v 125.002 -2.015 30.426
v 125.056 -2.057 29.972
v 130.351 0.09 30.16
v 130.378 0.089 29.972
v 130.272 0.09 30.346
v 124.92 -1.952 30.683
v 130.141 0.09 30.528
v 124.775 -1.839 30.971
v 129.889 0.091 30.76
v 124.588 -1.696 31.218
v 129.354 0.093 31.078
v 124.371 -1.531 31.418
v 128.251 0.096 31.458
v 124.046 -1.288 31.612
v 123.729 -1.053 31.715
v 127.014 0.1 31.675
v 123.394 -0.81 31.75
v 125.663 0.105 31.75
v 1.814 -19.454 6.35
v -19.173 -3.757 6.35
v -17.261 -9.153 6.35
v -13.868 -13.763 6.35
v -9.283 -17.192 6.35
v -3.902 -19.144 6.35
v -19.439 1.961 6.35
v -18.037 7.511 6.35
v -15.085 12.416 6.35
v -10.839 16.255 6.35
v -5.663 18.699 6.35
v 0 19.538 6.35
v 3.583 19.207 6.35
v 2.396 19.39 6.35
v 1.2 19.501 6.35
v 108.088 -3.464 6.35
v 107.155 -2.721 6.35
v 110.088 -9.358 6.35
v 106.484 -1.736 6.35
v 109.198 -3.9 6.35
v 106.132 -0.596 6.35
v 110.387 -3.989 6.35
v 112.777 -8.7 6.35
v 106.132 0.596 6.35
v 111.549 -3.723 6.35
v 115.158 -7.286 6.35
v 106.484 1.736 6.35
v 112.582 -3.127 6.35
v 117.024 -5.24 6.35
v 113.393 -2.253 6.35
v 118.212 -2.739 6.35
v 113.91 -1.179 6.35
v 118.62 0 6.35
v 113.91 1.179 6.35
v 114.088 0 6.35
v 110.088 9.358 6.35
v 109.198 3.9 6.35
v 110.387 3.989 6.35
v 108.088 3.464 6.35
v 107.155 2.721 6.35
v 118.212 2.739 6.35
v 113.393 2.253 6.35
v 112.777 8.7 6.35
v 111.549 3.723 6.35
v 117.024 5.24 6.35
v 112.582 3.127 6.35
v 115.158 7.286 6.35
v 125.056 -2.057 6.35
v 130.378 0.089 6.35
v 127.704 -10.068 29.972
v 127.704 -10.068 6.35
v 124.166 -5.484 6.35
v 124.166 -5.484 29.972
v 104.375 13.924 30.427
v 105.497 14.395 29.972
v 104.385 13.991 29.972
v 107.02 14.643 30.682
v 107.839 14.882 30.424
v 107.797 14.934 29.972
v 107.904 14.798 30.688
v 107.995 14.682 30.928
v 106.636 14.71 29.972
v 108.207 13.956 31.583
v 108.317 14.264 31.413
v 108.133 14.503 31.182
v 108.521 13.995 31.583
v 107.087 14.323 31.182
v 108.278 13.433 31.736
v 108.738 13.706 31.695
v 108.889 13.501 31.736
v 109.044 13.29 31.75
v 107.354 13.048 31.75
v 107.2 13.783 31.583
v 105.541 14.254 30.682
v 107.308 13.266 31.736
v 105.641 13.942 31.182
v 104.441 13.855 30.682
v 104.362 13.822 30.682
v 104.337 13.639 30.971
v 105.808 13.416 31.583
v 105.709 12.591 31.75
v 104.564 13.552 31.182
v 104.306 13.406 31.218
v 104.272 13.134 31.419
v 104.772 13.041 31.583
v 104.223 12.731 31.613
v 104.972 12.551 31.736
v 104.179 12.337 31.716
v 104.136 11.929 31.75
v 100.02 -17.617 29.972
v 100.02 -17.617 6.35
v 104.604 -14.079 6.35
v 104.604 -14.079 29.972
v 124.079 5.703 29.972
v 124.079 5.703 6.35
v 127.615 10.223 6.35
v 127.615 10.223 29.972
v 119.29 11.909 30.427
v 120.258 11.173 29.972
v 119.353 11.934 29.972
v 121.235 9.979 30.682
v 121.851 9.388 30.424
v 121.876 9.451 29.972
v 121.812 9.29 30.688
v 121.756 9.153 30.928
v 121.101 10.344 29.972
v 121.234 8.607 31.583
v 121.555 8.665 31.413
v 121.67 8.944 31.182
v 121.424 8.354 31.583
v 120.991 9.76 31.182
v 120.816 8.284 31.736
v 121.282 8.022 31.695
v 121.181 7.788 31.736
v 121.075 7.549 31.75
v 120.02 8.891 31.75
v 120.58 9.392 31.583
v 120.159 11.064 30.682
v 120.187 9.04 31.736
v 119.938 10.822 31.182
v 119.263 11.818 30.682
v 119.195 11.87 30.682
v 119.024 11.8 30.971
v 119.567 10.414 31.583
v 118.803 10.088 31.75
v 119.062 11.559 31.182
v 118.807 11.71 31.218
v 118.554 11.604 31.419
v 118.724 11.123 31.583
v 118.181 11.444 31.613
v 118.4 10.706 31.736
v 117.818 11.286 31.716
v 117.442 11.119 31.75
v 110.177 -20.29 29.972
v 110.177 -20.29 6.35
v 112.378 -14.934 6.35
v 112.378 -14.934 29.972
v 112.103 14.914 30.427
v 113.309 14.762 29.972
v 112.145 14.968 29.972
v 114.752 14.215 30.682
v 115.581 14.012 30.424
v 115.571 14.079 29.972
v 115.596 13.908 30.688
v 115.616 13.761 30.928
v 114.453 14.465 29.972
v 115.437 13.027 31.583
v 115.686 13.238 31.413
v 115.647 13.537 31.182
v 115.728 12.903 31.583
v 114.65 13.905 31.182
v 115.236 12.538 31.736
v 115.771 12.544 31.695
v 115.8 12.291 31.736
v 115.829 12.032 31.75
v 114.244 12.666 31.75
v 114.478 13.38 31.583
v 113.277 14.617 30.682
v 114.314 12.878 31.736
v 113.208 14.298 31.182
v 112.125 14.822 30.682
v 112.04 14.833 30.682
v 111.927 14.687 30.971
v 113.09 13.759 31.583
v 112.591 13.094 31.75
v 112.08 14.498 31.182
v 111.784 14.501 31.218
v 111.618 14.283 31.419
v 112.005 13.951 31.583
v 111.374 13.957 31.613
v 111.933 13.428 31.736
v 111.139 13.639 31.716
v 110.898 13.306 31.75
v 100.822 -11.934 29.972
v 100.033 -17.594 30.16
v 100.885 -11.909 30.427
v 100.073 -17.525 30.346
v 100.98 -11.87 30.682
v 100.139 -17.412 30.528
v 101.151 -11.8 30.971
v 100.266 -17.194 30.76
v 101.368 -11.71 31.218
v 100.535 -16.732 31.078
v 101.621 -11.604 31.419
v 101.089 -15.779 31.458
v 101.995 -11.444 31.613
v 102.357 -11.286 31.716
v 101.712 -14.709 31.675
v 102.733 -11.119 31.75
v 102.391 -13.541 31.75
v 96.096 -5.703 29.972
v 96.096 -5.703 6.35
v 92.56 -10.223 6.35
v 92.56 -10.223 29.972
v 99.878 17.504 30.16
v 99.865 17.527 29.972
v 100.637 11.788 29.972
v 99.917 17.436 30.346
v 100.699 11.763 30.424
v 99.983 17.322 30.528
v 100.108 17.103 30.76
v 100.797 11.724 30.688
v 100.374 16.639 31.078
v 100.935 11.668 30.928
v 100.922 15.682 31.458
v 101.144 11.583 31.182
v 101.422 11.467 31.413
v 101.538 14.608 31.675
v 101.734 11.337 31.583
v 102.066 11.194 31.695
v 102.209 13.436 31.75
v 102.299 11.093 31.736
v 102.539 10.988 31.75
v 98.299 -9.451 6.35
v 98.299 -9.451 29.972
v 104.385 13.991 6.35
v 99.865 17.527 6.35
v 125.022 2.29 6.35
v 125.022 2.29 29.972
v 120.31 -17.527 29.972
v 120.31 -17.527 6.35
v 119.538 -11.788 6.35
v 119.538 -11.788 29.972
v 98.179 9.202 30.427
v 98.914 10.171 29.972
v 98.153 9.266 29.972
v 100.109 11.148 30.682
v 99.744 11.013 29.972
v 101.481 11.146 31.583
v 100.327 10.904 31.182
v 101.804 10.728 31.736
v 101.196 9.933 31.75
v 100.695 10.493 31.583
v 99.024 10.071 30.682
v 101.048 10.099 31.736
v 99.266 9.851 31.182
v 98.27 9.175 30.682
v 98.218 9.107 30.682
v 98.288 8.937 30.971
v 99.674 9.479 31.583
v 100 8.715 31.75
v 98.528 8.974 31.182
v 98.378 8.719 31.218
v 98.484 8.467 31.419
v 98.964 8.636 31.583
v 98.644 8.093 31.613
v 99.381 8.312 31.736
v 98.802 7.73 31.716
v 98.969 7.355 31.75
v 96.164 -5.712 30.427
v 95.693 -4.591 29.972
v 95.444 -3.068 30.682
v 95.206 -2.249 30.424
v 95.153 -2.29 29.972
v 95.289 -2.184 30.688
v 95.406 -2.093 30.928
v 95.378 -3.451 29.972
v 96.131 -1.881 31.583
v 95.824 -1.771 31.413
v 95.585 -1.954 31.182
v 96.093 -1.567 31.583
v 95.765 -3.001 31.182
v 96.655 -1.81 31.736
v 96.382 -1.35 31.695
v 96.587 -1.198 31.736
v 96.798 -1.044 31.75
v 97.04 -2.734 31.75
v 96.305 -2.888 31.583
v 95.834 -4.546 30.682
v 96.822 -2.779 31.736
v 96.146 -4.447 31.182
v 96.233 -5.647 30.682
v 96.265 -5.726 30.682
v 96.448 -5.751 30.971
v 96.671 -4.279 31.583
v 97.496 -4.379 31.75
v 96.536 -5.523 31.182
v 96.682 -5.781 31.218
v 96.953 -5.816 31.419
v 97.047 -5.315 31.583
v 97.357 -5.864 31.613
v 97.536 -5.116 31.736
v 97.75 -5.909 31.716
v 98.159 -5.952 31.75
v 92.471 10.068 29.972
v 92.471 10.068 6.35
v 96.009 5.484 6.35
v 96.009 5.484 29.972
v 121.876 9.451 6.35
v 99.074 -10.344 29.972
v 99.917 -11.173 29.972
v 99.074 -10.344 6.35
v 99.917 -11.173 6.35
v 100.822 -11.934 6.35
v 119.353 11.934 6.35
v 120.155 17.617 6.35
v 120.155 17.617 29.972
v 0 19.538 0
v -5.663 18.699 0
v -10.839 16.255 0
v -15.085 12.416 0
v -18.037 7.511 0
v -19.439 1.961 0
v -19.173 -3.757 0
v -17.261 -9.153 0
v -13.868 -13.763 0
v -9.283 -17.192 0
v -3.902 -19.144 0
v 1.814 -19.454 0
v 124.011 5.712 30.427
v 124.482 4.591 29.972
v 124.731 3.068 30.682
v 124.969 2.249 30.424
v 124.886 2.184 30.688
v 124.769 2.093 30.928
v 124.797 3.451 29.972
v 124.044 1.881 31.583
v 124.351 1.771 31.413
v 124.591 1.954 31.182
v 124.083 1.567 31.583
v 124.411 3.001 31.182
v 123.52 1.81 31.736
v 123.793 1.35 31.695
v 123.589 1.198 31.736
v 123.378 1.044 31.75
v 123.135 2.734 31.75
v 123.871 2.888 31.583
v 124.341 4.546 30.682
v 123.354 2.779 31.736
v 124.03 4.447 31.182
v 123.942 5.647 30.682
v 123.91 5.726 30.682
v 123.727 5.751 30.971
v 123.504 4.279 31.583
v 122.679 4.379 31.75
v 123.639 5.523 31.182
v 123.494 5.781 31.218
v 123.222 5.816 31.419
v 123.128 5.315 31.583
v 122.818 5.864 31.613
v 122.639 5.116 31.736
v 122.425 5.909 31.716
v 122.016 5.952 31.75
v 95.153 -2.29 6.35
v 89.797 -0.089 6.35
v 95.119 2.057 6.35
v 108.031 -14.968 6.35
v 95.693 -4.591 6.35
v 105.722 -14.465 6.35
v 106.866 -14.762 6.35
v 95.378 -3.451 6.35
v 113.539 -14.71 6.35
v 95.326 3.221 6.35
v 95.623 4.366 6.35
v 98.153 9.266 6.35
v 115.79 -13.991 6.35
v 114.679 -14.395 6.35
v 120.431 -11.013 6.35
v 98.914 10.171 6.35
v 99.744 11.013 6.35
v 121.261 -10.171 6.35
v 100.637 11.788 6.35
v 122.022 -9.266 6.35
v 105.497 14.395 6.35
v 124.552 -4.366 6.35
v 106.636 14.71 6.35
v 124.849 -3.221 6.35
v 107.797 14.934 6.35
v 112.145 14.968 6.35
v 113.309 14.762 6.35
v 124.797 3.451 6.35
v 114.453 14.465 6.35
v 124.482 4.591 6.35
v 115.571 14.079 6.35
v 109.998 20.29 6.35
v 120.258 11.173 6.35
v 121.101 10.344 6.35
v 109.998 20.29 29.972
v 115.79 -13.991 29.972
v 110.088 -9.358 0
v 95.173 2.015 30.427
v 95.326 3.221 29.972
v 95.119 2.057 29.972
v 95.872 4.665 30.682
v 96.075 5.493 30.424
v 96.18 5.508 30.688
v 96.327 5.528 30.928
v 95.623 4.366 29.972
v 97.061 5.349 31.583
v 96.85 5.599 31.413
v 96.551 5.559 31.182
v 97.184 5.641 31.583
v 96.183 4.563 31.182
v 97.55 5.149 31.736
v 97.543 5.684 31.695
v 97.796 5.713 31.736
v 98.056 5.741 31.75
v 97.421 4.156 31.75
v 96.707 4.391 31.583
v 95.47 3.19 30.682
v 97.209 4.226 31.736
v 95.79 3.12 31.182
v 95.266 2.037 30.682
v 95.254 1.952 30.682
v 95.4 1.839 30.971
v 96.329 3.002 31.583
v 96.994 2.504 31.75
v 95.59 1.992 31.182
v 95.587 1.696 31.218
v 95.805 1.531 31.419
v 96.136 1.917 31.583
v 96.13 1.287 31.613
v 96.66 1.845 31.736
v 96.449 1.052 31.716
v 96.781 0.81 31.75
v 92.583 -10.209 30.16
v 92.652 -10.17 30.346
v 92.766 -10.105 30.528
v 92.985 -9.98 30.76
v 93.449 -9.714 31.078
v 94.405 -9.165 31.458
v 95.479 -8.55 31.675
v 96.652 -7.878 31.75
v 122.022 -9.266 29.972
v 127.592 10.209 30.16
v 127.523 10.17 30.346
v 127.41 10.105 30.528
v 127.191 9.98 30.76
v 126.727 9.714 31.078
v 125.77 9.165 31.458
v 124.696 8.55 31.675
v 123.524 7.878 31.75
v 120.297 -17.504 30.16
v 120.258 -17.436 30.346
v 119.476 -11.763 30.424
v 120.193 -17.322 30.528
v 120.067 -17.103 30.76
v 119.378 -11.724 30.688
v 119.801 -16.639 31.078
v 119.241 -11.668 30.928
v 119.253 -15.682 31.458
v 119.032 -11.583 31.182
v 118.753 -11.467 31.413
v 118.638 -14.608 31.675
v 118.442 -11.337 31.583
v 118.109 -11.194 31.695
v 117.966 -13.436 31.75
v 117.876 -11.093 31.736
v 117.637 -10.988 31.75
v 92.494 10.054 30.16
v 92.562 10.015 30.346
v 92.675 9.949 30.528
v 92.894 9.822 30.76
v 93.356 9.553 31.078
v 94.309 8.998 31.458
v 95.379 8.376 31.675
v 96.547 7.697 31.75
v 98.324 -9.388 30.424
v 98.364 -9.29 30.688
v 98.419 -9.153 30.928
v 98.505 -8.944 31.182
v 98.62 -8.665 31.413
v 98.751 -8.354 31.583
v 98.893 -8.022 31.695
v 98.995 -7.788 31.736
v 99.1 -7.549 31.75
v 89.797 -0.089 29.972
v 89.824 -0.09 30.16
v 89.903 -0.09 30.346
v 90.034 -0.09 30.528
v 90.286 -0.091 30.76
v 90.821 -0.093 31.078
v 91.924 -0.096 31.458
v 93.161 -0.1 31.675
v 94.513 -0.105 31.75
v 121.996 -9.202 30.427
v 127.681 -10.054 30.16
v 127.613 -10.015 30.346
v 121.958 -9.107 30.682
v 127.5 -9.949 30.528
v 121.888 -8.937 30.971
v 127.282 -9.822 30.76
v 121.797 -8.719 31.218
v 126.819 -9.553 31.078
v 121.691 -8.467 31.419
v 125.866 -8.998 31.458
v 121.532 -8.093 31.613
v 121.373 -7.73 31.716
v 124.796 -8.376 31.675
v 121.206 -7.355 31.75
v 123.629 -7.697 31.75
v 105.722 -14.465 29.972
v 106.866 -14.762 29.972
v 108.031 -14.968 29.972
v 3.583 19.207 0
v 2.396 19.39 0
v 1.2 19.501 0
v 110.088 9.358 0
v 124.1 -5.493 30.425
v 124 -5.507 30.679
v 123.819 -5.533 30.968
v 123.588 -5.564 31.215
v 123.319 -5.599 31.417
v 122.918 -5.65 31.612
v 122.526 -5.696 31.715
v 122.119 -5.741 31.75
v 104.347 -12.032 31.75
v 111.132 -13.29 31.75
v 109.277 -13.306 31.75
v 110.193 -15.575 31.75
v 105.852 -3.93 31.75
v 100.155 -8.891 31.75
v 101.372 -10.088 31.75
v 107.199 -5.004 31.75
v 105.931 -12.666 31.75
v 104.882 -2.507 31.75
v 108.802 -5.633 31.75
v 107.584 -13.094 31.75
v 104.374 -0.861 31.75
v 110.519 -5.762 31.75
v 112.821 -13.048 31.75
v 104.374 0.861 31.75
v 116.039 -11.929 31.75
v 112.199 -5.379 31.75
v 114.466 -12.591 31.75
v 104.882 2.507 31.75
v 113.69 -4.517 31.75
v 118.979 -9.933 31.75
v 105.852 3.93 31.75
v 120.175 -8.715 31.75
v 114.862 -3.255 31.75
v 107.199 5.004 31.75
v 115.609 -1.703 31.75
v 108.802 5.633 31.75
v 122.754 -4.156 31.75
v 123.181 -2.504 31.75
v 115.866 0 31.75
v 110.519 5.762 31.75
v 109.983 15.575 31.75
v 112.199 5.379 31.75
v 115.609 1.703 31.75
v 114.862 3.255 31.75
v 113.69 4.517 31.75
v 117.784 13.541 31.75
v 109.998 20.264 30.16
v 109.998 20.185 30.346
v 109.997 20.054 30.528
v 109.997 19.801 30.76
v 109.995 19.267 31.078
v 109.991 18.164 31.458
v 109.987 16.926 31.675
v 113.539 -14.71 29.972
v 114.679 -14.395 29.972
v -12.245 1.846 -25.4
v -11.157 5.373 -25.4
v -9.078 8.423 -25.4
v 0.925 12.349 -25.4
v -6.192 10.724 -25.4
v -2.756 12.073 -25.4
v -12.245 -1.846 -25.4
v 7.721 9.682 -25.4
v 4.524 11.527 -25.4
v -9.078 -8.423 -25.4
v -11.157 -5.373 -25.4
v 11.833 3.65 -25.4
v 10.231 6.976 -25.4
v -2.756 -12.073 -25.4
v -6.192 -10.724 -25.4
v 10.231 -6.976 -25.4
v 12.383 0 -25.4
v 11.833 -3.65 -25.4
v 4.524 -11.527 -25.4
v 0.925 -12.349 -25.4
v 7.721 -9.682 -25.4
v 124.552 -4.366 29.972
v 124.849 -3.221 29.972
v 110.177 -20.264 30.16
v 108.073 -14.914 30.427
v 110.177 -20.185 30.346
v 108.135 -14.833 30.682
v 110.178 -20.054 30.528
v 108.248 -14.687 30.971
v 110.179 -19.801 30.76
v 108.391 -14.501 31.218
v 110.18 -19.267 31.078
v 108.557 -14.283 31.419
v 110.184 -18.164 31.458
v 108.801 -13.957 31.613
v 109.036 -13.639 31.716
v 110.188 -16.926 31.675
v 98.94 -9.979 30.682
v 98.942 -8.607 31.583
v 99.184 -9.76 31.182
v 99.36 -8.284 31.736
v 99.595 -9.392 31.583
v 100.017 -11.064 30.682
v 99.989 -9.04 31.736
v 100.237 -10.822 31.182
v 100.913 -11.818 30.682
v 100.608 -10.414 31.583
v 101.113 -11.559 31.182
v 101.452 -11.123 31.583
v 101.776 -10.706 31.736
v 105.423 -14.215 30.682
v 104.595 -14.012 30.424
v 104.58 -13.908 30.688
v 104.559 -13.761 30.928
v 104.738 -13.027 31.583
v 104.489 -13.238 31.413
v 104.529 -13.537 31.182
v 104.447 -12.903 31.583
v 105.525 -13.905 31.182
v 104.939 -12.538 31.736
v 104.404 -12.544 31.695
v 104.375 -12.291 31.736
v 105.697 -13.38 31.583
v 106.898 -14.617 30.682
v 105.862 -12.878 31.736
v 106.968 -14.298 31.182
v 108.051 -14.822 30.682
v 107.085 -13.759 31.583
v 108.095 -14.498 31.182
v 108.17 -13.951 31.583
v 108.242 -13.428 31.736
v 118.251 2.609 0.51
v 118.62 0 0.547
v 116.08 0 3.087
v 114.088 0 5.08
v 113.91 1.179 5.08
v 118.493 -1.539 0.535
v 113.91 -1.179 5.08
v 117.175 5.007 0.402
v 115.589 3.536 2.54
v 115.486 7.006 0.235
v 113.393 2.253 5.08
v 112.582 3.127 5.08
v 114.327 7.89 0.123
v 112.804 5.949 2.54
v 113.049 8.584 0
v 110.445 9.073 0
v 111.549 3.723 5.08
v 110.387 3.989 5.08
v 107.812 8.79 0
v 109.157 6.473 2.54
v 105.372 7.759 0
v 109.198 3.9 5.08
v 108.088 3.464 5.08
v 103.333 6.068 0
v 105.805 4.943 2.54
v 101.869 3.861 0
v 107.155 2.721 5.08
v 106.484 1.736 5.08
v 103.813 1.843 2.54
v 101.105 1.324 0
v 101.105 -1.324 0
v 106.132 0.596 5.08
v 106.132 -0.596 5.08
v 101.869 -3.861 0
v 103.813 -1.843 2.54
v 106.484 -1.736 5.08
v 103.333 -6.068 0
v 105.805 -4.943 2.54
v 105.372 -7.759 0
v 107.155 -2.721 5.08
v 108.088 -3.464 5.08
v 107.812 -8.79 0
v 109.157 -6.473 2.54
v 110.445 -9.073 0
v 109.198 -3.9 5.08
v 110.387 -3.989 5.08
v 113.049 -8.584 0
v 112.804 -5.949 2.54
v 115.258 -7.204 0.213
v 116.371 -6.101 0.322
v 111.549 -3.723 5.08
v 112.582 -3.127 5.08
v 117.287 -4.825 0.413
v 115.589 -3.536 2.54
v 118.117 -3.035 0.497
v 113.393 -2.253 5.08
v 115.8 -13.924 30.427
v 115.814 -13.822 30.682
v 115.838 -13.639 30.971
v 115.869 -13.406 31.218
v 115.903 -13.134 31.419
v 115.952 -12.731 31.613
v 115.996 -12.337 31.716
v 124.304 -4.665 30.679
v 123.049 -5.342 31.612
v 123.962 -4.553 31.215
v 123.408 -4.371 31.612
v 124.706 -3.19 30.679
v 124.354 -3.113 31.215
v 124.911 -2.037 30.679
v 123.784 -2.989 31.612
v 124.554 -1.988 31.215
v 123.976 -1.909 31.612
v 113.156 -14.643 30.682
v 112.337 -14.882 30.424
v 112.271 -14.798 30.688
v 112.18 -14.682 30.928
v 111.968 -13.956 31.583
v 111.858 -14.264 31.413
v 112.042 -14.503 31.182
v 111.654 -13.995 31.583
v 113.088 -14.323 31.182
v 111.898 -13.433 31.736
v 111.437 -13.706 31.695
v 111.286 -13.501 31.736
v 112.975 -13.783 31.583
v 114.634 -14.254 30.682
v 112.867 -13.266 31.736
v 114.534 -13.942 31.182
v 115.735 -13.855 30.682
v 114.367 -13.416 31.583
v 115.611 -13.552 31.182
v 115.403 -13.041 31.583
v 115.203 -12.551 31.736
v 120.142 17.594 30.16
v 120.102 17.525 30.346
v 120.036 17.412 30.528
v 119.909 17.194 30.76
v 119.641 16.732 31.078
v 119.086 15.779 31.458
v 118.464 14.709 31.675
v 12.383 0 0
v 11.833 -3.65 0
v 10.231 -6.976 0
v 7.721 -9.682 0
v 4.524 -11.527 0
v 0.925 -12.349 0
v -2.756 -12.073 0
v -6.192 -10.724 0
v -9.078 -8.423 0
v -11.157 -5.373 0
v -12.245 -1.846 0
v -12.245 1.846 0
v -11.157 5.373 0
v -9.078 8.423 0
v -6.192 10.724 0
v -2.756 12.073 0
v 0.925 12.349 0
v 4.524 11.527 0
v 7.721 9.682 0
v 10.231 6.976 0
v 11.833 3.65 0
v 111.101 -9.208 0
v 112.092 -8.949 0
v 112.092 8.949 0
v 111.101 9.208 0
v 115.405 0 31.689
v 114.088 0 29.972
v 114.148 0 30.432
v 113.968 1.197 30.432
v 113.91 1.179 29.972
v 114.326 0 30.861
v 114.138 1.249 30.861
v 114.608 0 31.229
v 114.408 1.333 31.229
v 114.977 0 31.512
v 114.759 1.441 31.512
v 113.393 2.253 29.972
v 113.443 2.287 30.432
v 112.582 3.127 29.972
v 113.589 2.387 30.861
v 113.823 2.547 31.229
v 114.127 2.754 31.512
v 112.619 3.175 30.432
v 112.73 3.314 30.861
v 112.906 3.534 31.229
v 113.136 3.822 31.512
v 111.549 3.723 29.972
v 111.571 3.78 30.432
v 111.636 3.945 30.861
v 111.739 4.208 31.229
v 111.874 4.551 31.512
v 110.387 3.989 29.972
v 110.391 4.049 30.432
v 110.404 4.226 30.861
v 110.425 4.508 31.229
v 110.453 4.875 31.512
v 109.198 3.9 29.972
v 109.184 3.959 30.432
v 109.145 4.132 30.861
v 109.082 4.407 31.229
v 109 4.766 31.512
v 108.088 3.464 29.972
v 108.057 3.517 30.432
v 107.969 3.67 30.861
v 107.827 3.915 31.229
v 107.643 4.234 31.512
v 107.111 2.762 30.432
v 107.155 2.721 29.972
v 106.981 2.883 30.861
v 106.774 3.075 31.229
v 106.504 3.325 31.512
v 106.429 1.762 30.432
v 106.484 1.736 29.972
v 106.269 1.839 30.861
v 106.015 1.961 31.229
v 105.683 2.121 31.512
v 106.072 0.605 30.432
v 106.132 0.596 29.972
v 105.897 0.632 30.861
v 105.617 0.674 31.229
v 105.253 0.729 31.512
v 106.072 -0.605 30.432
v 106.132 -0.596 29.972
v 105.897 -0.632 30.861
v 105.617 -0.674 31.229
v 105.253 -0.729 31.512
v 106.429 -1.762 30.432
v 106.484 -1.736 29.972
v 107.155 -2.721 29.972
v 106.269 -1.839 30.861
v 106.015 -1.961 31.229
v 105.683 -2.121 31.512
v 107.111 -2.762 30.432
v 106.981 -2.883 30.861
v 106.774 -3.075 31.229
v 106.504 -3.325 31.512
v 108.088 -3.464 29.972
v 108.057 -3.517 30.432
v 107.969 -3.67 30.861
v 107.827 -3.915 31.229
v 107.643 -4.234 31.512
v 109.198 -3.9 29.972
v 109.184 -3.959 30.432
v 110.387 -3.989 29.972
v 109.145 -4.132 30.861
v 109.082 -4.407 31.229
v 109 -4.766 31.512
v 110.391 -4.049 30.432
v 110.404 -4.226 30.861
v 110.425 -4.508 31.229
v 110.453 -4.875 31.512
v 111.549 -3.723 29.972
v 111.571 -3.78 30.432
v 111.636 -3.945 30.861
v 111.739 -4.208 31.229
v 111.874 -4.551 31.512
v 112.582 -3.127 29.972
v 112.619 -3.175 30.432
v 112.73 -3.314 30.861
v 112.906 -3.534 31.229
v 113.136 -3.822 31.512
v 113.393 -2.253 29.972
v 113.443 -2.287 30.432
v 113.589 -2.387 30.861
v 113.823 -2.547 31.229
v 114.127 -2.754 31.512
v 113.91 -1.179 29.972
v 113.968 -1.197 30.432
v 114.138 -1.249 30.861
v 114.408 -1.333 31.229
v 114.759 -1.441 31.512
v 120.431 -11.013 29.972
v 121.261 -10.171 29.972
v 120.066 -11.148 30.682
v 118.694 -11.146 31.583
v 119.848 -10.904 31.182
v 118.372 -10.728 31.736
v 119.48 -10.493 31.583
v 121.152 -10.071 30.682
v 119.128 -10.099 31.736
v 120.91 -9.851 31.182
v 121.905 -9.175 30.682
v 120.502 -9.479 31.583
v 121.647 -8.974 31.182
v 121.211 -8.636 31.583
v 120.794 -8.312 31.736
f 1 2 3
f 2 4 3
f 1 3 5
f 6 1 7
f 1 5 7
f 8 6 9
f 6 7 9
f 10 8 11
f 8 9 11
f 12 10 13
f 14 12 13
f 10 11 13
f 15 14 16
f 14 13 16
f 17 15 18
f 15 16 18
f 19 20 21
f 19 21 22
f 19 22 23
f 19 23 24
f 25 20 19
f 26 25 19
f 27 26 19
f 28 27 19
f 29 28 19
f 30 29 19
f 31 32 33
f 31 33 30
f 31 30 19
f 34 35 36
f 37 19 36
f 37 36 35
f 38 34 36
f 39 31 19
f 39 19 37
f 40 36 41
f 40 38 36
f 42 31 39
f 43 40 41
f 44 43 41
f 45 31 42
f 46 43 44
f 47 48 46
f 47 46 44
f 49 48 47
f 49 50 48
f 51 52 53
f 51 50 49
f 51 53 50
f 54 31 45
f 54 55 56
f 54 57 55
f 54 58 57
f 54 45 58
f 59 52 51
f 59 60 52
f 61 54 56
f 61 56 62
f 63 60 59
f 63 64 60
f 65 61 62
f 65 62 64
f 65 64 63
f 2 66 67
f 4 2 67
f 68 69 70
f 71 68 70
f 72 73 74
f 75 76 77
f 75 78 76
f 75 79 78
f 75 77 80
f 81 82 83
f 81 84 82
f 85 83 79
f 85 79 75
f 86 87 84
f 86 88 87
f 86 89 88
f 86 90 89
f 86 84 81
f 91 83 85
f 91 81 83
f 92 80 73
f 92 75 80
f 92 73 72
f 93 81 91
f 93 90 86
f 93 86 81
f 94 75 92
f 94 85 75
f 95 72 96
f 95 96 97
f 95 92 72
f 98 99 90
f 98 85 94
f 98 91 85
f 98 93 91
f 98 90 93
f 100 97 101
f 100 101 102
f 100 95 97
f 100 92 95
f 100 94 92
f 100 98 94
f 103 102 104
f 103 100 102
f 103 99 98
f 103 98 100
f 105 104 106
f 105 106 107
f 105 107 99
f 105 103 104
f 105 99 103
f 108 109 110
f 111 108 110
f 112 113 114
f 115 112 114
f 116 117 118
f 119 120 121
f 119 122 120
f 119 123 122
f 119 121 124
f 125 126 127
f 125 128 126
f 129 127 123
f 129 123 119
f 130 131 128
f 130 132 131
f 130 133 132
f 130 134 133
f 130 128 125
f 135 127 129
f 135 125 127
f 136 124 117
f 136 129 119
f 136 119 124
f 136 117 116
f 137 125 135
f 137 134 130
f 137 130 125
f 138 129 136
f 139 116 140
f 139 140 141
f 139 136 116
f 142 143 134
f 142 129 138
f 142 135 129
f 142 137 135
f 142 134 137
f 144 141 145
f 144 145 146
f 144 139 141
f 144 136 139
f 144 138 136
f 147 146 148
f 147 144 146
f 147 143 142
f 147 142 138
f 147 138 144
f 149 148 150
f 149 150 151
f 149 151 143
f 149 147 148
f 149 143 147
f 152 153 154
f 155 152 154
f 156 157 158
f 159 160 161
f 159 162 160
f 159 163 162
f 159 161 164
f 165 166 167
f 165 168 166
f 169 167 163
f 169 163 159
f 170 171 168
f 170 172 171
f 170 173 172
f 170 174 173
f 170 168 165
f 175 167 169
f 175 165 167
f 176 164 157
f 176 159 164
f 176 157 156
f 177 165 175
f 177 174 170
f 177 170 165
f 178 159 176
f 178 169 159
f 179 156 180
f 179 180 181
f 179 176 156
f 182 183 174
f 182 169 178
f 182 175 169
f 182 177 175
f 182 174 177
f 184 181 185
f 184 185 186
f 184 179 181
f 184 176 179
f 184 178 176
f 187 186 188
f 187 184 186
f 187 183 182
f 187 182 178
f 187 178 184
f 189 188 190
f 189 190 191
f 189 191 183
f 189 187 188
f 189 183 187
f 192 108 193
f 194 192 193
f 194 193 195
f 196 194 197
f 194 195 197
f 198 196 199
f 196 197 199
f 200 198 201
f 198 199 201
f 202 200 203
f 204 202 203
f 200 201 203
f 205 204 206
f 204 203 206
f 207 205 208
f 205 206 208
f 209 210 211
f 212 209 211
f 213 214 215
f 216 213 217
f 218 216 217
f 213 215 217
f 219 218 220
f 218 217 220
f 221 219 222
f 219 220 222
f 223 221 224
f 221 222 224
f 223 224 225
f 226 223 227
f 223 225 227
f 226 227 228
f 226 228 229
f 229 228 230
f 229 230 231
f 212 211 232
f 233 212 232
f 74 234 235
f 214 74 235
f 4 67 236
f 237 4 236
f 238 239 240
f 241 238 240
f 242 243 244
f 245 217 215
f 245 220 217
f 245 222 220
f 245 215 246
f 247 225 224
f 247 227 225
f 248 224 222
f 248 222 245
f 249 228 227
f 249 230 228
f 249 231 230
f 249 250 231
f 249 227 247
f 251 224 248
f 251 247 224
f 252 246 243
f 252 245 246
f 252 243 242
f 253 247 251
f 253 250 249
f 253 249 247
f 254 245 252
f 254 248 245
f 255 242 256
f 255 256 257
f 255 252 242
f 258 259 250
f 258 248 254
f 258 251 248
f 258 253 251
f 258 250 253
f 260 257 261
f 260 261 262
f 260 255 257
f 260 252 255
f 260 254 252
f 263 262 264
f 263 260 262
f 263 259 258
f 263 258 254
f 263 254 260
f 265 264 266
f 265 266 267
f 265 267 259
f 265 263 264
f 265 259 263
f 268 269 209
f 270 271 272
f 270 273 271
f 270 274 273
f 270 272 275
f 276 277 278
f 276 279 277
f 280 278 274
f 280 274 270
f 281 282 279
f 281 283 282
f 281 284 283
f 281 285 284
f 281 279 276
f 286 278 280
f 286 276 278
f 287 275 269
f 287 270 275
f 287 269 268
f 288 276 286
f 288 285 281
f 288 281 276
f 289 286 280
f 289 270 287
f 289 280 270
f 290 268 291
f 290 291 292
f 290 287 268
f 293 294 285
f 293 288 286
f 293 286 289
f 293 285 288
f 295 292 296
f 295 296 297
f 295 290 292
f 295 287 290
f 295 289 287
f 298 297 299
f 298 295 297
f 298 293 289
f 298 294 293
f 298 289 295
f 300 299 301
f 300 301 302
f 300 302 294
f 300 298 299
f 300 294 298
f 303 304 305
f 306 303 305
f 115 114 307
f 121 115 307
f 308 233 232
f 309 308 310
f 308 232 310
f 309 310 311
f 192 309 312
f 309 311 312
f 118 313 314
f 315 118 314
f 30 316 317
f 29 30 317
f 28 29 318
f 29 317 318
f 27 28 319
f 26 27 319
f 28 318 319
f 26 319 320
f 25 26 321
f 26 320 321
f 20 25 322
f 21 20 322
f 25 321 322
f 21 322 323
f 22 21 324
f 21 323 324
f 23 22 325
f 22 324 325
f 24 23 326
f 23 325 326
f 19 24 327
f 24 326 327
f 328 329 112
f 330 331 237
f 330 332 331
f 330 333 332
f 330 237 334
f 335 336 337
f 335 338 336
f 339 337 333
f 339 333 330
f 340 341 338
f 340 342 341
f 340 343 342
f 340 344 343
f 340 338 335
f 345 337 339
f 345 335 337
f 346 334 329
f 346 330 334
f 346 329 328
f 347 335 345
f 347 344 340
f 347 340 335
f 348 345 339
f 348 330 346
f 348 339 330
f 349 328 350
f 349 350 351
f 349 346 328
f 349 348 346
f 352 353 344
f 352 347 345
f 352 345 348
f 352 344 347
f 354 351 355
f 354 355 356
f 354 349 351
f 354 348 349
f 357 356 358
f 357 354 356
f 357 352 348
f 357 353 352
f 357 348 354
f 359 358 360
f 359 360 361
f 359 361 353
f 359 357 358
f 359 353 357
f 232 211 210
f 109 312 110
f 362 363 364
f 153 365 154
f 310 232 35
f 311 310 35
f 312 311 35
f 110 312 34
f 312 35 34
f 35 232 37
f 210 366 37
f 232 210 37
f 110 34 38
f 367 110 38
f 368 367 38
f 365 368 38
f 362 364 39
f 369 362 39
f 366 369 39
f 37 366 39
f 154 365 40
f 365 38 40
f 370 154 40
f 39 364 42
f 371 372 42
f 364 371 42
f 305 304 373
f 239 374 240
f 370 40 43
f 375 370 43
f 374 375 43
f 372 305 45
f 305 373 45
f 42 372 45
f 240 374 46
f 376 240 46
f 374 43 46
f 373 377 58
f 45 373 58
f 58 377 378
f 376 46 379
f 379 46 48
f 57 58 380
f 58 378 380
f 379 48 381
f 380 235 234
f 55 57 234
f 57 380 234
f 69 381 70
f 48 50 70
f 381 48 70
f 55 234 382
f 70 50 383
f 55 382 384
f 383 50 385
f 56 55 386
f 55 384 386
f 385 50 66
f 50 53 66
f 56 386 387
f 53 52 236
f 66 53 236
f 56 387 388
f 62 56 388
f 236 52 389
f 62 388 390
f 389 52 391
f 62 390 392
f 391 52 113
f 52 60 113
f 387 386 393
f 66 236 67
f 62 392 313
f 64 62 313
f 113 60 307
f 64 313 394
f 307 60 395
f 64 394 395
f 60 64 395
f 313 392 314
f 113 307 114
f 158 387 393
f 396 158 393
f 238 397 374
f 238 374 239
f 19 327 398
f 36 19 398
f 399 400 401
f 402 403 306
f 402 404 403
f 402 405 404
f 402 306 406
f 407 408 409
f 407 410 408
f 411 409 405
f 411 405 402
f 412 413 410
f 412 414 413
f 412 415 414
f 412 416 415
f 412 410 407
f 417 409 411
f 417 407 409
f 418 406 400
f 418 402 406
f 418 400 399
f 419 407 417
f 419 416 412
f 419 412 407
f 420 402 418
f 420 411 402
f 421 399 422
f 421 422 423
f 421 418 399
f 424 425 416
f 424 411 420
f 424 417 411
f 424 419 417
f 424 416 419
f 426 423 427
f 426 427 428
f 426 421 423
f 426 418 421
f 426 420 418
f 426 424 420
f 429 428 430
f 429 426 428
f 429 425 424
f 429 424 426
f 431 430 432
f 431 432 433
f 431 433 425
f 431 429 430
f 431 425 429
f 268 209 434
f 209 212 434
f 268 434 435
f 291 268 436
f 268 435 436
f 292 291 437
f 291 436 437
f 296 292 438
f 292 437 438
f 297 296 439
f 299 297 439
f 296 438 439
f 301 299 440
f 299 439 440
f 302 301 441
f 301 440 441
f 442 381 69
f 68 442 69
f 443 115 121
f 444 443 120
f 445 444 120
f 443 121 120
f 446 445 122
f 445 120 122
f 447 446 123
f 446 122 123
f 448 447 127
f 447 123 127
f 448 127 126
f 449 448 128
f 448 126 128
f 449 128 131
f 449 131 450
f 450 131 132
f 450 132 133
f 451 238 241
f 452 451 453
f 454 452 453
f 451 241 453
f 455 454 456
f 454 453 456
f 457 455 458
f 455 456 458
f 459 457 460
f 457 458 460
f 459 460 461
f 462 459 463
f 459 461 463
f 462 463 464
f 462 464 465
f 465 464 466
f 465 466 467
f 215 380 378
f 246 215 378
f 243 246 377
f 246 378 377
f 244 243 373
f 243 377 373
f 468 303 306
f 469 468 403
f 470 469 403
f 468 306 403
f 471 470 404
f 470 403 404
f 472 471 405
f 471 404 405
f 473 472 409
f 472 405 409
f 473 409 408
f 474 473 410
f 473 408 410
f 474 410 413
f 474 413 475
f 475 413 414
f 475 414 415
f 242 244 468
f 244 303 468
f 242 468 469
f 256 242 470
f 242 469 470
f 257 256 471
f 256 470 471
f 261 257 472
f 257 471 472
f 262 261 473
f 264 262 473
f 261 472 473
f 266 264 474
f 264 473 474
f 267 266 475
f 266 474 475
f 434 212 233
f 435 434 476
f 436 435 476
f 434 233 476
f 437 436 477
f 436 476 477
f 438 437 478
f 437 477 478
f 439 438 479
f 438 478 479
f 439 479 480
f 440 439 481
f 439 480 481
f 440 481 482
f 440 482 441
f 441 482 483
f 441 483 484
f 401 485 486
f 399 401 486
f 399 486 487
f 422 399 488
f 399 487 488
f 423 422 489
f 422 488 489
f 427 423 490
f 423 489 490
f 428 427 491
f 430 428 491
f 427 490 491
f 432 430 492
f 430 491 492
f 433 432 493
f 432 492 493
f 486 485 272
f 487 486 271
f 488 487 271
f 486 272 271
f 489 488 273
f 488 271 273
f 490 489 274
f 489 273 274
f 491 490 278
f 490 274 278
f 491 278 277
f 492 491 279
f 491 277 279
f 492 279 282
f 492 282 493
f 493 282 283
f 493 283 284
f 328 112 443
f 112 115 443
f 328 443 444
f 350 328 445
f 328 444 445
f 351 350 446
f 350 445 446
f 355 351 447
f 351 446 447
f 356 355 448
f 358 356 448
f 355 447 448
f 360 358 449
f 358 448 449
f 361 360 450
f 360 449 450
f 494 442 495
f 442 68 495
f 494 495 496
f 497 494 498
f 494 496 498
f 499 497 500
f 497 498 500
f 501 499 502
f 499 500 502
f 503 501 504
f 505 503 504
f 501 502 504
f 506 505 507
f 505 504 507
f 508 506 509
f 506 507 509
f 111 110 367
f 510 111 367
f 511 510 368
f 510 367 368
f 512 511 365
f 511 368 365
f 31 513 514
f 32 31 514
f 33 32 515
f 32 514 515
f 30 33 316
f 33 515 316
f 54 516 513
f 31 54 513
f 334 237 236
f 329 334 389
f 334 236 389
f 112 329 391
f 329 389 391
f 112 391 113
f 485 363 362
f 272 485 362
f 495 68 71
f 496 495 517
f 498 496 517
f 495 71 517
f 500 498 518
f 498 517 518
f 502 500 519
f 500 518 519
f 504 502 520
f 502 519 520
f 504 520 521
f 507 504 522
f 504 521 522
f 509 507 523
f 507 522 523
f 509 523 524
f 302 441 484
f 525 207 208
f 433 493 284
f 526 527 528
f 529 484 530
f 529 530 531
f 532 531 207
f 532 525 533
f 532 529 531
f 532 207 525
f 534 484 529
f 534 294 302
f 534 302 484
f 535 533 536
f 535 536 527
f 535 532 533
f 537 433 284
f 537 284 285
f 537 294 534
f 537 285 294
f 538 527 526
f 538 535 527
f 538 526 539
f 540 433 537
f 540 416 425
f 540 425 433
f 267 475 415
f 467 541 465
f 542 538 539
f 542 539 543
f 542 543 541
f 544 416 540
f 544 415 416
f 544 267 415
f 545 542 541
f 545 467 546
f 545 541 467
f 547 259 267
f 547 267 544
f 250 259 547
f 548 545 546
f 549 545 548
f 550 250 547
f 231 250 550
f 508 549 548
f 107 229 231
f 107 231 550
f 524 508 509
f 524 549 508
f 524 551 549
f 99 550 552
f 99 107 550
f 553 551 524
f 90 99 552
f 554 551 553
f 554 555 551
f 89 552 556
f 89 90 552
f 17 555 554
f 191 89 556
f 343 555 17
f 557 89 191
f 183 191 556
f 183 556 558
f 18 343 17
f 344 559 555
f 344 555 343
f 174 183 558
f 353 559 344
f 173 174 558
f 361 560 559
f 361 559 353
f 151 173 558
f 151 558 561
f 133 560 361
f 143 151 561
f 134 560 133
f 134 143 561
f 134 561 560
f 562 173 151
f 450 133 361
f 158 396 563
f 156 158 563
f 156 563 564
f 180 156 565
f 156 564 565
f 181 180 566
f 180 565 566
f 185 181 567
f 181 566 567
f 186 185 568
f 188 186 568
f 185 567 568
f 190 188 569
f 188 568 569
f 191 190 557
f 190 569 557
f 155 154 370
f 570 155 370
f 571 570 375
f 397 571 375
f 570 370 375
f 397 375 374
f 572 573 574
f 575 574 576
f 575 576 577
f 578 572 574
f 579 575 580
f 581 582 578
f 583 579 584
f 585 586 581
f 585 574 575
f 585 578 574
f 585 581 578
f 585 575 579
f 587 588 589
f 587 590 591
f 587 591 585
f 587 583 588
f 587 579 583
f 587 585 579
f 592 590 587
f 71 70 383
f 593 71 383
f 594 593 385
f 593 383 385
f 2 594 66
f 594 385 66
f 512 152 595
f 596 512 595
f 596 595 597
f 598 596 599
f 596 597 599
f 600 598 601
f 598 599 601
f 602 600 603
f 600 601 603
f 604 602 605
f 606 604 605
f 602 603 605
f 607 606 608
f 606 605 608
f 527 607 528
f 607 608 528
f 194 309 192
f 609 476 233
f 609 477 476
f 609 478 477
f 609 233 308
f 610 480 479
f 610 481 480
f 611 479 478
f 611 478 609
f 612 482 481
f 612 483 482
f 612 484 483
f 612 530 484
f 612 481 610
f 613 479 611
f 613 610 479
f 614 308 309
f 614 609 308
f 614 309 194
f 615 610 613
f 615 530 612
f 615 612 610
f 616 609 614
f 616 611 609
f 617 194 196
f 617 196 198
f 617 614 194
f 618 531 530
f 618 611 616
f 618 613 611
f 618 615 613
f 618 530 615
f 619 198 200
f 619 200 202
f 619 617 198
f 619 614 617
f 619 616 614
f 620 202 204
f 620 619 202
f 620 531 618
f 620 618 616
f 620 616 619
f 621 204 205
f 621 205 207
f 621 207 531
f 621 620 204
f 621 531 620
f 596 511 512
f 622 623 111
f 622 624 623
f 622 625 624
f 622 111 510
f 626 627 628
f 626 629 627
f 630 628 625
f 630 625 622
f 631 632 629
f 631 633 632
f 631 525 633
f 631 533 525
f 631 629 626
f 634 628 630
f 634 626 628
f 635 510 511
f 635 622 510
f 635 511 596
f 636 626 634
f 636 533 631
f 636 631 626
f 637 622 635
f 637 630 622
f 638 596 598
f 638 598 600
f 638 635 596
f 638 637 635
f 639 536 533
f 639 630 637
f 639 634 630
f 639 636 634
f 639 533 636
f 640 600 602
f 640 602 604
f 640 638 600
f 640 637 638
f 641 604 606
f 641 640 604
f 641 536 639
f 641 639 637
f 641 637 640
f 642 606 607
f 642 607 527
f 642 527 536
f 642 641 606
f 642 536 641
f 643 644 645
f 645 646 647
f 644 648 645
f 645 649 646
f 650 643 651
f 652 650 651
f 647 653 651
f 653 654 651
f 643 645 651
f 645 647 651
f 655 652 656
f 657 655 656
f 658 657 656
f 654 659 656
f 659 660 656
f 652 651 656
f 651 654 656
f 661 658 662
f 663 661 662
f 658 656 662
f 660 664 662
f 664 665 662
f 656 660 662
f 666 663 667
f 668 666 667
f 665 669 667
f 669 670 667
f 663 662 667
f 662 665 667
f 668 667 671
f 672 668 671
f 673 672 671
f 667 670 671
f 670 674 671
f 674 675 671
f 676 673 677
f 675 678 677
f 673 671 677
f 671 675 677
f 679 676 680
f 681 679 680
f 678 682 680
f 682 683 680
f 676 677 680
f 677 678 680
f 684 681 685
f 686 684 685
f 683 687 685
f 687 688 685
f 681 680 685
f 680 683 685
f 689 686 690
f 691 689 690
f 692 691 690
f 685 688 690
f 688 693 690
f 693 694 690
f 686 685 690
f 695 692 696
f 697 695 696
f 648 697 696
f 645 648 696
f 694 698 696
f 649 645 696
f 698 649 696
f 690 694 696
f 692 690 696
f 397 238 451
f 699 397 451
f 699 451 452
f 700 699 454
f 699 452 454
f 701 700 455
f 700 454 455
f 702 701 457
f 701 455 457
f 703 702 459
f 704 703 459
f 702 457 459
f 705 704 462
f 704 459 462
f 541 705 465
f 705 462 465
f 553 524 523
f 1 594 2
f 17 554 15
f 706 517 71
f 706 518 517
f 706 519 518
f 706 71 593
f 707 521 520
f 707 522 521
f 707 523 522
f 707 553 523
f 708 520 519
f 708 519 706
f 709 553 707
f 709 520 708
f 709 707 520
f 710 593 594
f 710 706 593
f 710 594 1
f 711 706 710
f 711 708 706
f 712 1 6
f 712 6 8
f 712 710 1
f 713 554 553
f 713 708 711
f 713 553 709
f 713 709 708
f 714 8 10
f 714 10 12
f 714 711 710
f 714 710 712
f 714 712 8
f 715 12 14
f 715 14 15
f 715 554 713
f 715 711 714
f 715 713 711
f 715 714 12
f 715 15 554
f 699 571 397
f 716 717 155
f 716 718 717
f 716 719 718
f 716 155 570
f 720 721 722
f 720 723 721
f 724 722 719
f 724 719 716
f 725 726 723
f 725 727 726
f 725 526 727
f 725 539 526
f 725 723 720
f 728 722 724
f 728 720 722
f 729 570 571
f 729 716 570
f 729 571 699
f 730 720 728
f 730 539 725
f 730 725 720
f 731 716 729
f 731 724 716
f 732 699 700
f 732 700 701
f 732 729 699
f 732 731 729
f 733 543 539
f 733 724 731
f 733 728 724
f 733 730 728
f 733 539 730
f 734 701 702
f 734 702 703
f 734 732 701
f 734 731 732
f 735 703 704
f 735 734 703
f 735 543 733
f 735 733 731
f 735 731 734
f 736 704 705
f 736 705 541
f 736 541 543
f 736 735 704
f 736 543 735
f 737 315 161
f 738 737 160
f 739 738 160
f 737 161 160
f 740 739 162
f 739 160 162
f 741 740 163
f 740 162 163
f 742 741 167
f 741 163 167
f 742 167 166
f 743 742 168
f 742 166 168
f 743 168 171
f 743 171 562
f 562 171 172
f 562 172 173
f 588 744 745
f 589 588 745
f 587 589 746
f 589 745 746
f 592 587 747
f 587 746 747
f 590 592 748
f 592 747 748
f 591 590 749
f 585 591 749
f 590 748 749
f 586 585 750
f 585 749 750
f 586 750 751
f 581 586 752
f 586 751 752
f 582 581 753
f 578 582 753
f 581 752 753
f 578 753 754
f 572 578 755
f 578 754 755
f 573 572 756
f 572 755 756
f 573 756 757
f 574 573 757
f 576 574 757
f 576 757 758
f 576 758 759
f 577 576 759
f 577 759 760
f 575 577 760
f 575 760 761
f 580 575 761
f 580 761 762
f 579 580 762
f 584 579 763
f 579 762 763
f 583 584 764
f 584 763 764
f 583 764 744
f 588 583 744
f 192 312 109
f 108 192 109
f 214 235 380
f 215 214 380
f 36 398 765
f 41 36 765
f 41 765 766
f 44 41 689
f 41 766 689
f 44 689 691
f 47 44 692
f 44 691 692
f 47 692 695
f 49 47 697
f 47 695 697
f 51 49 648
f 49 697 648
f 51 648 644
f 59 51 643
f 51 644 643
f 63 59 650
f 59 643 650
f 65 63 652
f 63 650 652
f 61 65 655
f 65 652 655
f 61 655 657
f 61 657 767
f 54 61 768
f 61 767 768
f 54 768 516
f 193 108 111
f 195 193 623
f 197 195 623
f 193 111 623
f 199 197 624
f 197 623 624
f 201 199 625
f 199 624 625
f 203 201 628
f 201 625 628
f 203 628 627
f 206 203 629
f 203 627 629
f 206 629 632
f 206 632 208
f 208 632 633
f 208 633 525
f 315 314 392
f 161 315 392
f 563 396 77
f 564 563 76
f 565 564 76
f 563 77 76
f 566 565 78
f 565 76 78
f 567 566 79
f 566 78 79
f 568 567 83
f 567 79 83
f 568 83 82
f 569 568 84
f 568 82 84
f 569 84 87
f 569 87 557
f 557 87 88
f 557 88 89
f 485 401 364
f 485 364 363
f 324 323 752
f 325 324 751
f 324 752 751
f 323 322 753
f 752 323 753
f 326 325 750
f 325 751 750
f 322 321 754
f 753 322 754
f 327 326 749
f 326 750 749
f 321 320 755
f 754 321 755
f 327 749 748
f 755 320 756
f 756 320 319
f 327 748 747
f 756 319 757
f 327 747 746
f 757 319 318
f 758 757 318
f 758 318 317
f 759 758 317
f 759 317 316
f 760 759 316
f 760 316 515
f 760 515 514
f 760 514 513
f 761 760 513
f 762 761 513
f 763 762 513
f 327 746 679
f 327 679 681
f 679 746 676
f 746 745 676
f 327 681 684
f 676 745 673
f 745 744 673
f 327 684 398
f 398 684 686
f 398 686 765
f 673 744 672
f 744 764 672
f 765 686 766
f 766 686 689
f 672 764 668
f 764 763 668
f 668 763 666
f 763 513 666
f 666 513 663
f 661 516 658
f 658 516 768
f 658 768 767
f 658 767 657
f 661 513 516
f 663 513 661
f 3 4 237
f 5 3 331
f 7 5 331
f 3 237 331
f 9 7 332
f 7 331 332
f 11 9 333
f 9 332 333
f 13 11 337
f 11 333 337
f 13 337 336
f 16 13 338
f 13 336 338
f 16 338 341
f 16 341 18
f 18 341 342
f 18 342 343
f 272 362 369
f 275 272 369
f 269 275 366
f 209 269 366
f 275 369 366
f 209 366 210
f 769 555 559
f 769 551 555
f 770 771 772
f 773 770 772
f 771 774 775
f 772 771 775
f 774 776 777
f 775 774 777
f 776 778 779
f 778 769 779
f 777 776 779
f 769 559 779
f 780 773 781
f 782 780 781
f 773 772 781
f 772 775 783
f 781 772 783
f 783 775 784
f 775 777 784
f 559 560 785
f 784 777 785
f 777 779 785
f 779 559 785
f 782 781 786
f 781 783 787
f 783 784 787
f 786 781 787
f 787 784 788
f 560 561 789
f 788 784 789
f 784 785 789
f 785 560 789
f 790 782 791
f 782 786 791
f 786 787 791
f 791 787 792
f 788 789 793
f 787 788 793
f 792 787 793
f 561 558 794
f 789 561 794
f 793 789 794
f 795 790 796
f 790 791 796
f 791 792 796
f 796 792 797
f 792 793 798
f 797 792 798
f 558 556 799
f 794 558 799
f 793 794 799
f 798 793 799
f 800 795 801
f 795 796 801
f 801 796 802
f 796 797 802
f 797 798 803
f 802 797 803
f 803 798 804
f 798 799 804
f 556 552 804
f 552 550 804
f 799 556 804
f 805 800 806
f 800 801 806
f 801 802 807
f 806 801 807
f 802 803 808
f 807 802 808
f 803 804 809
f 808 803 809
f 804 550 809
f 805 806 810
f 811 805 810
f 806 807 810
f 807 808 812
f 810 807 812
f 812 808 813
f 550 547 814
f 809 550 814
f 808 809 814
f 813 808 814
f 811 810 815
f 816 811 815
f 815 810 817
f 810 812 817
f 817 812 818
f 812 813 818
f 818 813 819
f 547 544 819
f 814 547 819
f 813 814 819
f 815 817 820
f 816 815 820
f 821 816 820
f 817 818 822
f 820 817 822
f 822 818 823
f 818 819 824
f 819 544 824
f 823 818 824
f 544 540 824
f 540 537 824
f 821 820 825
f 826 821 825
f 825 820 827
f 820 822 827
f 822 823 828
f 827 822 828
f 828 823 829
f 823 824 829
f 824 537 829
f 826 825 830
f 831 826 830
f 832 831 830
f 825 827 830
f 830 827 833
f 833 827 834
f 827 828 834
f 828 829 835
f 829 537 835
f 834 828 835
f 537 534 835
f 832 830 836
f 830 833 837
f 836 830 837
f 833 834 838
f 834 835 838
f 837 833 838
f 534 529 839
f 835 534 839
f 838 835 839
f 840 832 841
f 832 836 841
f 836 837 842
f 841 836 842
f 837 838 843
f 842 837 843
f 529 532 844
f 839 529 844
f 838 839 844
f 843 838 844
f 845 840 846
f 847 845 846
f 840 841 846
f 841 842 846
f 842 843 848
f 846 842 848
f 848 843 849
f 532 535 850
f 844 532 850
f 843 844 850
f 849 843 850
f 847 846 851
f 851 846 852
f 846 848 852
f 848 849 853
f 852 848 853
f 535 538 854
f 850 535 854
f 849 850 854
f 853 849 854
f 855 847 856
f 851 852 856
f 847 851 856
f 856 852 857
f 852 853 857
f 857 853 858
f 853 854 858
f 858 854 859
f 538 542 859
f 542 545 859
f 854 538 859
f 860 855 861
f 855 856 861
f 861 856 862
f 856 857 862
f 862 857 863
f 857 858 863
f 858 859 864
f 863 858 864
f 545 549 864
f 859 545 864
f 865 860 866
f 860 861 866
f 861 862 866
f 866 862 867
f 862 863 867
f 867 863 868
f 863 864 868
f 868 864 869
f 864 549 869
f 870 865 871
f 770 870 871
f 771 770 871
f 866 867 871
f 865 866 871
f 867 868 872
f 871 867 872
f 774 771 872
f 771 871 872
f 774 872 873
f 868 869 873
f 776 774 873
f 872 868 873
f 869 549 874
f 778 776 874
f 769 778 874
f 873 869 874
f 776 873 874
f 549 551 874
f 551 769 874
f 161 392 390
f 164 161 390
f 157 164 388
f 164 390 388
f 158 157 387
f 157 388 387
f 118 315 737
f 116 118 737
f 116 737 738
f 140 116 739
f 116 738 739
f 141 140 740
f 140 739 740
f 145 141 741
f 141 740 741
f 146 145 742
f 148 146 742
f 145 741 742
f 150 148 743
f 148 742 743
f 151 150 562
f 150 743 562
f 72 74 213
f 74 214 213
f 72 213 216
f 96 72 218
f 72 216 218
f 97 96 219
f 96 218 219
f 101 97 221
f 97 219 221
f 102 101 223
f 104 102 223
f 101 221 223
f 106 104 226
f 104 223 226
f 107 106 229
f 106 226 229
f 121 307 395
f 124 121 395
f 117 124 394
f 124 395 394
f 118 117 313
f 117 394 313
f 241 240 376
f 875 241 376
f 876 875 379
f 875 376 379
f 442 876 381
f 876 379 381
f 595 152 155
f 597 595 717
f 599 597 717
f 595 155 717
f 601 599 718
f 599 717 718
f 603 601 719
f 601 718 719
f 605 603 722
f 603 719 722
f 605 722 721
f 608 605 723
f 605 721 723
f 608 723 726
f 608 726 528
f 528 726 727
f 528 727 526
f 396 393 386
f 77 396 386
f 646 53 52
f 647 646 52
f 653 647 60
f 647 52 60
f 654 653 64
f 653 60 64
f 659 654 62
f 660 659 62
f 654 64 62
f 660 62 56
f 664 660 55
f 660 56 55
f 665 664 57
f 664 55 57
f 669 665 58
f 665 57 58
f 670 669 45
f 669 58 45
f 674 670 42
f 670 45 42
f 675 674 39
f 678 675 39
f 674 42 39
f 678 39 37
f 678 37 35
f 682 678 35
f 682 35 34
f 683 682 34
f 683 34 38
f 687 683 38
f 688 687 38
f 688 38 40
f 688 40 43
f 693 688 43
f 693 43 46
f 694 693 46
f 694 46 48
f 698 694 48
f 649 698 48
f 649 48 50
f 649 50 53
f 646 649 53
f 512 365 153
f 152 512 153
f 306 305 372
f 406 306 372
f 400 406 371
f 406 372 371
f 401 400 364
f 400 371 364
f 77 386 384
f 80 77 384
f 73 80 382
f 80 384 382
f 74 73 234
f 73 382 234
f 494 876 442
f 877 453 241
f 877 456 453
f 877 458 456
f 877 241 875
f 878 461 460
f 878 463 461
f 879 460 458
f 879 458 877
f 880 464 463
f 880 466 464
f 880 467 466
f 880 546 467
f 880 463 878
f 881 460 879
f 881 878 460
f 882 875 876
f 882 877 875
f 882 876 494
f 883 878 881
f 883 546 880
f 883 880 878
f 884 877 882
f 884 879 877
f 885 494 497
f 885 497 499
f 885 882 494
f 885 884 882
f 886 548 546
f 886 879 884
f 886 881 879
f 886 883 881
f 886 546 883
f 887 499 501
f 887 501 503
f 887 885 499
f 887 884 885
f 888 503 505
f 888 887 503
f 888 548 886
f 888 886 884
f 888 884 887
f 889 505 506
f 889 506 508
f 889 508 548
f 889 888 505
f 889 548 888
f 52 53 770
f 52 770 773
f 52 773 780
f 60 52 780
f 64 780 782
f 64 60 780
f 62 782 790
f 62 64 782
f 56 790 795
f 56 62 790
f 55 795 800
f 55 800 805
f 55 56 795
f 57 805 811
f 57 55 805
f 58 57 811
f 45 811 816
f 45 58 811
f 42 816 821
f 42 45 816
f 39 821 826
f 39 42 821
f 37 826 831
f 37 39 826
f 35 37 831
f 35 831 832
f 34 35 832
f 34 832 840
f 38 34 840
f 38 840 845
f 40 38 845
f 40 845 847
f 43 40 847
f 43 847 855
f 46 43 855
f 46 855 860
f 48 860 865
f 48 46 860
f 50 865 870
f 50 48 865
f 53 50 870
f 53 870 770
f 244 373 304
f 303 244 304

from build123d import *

# Parameters (mm, degrees)
F1_DEPTH = 6.35
F2_R     = 4
F3_DEPTH = 25.4
F5_R     = 12.3831854663
F6_DEPTH = 25.4
F7_R     = 4
F8_DEPTH = 25.4
F9_R     = 1.778


# Not quite as in the source:
# - a fillet or chamfer that OpenCascade refuses, or shapes differently, is made with other operations: its cross-section is extruded or revolved along the edge and cut away or added


with BuildPart() as f1:
    # F0 (on Top) → F1 (new body)
    with BuildSketch(Plane.XY):
        with BuildLine():
            Line((0, 19.5379621843), (3.5827930435, 19.2066540637))
            ThreePointArc((3.5827930435, 19.2066540637), (1.7990394008, 19.4549588422), (0, 19.5379621843))
        make_face()
        with BuildLine():
            Line((110.0876327298, 9.3579360824), (3.5827930435, 19.2066540637))
            Line((3.5827930435, 19.2066540637), (0, 19.5379621843))
            ThreePointArc((0, 19.5379621843), (-19.5168552551, -0.9079247047), (1.813887741, -19.453580071))
            Line((1.8138877409, -19.453580071), (110.0876327298, -9.3579360824))
            ThreePointArc((110.0876327298, -9.3579360824), (118.6201465698, 0), (110.0876327298, 9.3579360824))
        make_face()
    extrude(amount=F1_DEPTH)

    # F2 (on face) → F3 (cut)
    with BuildSketch(Plane.XY.offset(6.35)):
        with Locations((110.0876327298, 0)):
            Circle(F2_R)
    extrude(amount=-F3_DEPTH, mode=Mode.SUBTRACT)

    # F4: chamfer of 5.08 on 1 edges, made by hand

    # F4_s1 → F4_t2 (revolve, cut)
    with BuildSketch(Plane.XZ):
        Polygon((119.1676327298, 0), (114.0876327298, 5.08), (114.0876327298, 0), align=None)
    revolve(axis=Axis((110.0876327298, 0, 0), (0, 0, 1)), mode=Mode.SUBTRACT)

    # F5 (on face) → F6 (join)
    with BuildSketch(Plane(origin=(0, 0, 0), x_dir=(1, 0, 0), z_dir=(0, 0, -1))):
        Circle(F5_R)
    extrude(amount=F6_DEPTH)


with BuildPart() as f8:
    # F7 (on face) → F8 (new body)
    with BuildSketch(Plane.XY.offset(6.35)):
        with BuildLine():
            ThreePointArc((125.0559656513, -2.0569956955), (125.1614333891, -1.0309002972), (125.1966440058, 0))
            ThreePointArc((125.1966440058, 0), (125.1529244508, 1.1485674127), (125.0220188001, 2.2904878178))
            ThreePointArc((125.0220188001, 2.2904878178), (124.6508382593, 4.0243342858), (124.0790871399, 5.7027559329))
            ThreePointArc((124.0790871399, 5.7027559329), (123.1130347073, 7.656443369), (121.8759465477, 9.4508136724))
            ThreePointArc((121.8759465477, 9.4508136724), (120.687571536, 10.7667784895), (119.3532097183, 11.9344587145))
            ThreePointArc((119.3532097183, 11.9344587145), (117.5397400523, 13.143375449), (115.5712051277, 14.0788016356))
            ThreePointArc((115.5712051277, 14.0788016356), (113.8840597698, 14.624273092), (112.1446284253, 14.9683329214))
            ThreePointArc((112.1446284253, 14.9683329214), (109.9696592584, 15.1085506915), (107.797144912, 14.9343860702))
            ThreePointArc((107.797144912, 14.9343860702), (106.0632984441, 14.5632055295), (104.3848767969, 13.99145441))
            ThreePointArc((104.3848767969, 13.99145441), (102.4311893608, 13.0254019775), (100.6368190574, 11.7883138179))
            ThreePointArc((100.6368190574, 11.7883138179), (99.3208542403, 10.5999388062), (98.1531740153, 9.2655769885))
            ThreePointArc((98.1531740153, 9.2655769885), (96.9442572809, 7.4521073225), (96.0088310942, 5.4835723979))
            ThreePointArc((96.0088310942, 5.4835723979), (95.4633596378, 3.79642704), (95.1192998084, 2.0569956955))
            ThreePointArc((95.1192998084, 2.0569956955), (94.9790820383, -0.1179734715), (95.1532466596, -2.2904878178))
            ThreePointArc((95.1532466596, -2.2904878178), (95.5244272003, -4.0243342858), (96.0961783198, -5.7027559329))
            ThreePointArc((96.0961783198, -5.7027559329), (97.0622307523, -7.656443369), (98.299318912, -9.4508136724))
            ThreePointArc((98.299318912, -9.4508136724), (99.4876939236, -10.7667784895), (100.8220557413, -11.9344587145))
            ThreePointArc((100.8220557413, -11.9344587145), (102.6355254073, -13.143375449), (104.604060332, -14.0788016356))
            ThreePointArc((104.604060332, -14.0788016356), (106.2912056898, -14.624273092), (108.0306370343, -14.9683329214))
            ThreePointArc((108.0306370343, -14.9683329214), (110.2056062013, -15.1085506915), (112.3781205476, -14.9343860702))
            ThreePointArc((112.3781205476, -14.9343860702), (114.1119670156, -14.5632055295), (115.7903886627, -13.99145441))
            ThreePointArc((115.7903886627, -13.99145441), (117.7440760988, -13.0254019775), (119.5384464022, -11.7883138179))
            ThreePointArc((119.5384464022, -11.7883138179), (120.8544112194, -10.5999388062), (122.0220914443, -9.2655769885))
            ThreePointArc((122.0220914443, -9.2655769885), (123.2310081788, -7.4521073225), (124.1664343655, -5.4835723979))
            ThreePointArc((124.1664343655, -5.4835723979), (124.7119058218, -3.79642704), (125.0559656513, -2.0569956955))
        make_face()
        with Locations((110.0876327298, 0)):
            Circle(F7_R, mode=Mode.SUBTRACT)
        with BuildLine():
            ThreePointArc((125.0220188001, 2.2904878178), (125.1529244508, 1.1485674127), (125.1966440058, 0))
            ThreePointArc((125.1966440058, 0), (125.1614333891, -1.0309002972), (125.0559656513, -2.0569956955))
            Line((125.0559656513, -2.0569956955), (130.3779385678, 0.0894885204))
            Line((130.3779385678, 0.0894885204), (125.0220188001, 2.2904878178))
        make_face()
        with BuildLine():
            ThreePointArc((121.8759465477, 9.4508136724), (123.1130347073, 7.656443369), (124.0790871399, 5.7027559329))
            Line((124.0790871399, 5.7027559329), (127.6148087759, 10.222652251))
            Line((127.6148087759, 10.222652251), (121.8759465477, 9.4508136724))
        make_face()
        with BuildLine():
            Line((127.7042972963, -10.067653587), (124.1664343655, -5.4835723979))
            ThreePointArc((124.1664343655, -5.4835723979), (123.2310081788, -7.4521073225), (122.0220914443, -9.2655769885))
            Line((122.0220914443, -9.2655769885), (127.7042972963, -10.067653587))
        make_face()
        with BuildLine():
            ThreePointArc((115.5712051277, 14.0788016356), (117.5397400523, 13.143375449), (119.3532097183, 11.9344587145))
            Line((119.3532097183, 11.9344587145), (120.1552863168, 17.6166645665))
            Line((120.1552863168, 17.6166645665), (115.5712051277, 14.0788016356))
        make_face()
        with BuildLine():
            Line((120.3102849809, -17.527176046), (119.5384464022, -11.7883138179))
            ThreePointArc((119.5384464022, -11.7883138179), (117.7440760988, -13.0254019775), (115.7903886627, -13.99145441))
            Line((115.7903886627, -13.99145441), (120.3102849809, -17.527176046))
        make_face()
        with BuildLine():
            ThreePointArc((107.797144912, 14.9343860702), (109.9696592584, 15.1085506915), (112.1446284253, 14.9683329214))
            Line((112.1446284253, 14.9683329214), (109.9981442094, 20.290305838))
            Line((109.9981442094, 20.290305838), (107.797144912, 14.9343860702))
        make_face()
        with BuildLine():
            Line((110.1771212503, -20.290305838), (112.3781205476, -14.9343860702))
            ThreePointArc((112.3781205476, -14.9343860702), (110.2056062013, -15.1085506915), (108.0306370343, -14.9683329214))
            Line((108.0306370343, -14.9683329214), (110.1771212503, -20.290305838))
        make_face()
        with BuildLine():
            ThreePointArc((100.6368190574, 11.7883138179), (102.4311893608, 13.0254019775), (104.3848767969, 13.99145441))
            Line((104.3848767969, 13.99145441), (99.8649804788, 17.527176046))
            Line((99.8649804788, 17.527176046), (100.6368190574, 11.7883138179))
        make_face()
        with BuildLine():
            Line((100.0199791429, -17.6166645665), (104.604060332, -14.0788016356))
            ThreePointArc((104.604060332, -14.0788016356), (102.6355254073, -13.143375449), (100.8220557413, -11.9344587145))
            Line((100.8220557413, -11.9344587145), (100.0199791429, -17.6166645665))
        make_face()
        with BuildLine():
            ThreePointArc((96.0088310942, 5.4835723979), (96.9442572809, 7.4521073225), (98.1531740153, 9.2655769885))
            Line((98.1531740153, 9.2655769885), (92.4709681633, 10.067653587))
            Line((92.4709681633, 10.067653587), (96.0088310942, 5.4835723979))
        make_face()
        with BuildLine():
            Line((92.5604566838, -10.222652251), (98.299318912, -9.4508136724))
            ThreePointArc((98.299318912, -9.4508136724), (97.0622307523, -7.656443369), (96.0961783198, -5.7027559329))
            Line((96.0961783198, -5.7027559329), (92.5604566838, -10.222652251))
        make_face()
        with BuildLine():
            ThreePointArc((95.1532466596, -2.2904878178), (94.9790820383, -0.1179734715), (95.1192998084, 2.0569956955))
            Line((95.1192998084, 2.0569956955), (89.7973268918, -0.0894885204))
            Line((89.7973268918, -0.0894885204), (95.1532466596, -2.2904878178))
        make_face()
    extrude(amount=F8_DEPTH)

    # F9
    f9_edges = [f8.edges().sort_by_distance(p)[0] for p in [
        (127.716952, -0.983754, 31.75),
        (127.699979, 1.189988, 31.75),
        (124.650838, 4.024334, 31.75),
        (125.846948, 7.962704, 31.75),
        (124.745378, 9.836733, 31.75),
        (120.687572, 10.766778, 31.75),
        (119.754248, 14.775562, 31.75),
        (117.863246, 15.847733, 31.75),
        (113.88406, 14.624273, 31.75),
        (111.071386, 17.629319, 31.75),
        (108.897645, 17.612346, 31.75),
        (106.063298, 14.563206, 31.75),
        (102.124929, 15.759315, 31.75),
        (100.2509, 14.657745, 31.75),
        (99.320854, 10.599939, 31.75),
        (95.312071, 9.666615, 31.75),
        (94.2399, 7.775613, 31.75),
        (95.46336, 3.796427, 31.75),
        (92.458313, 0.983754, 31.75),
        (92.475287, -1.189988, 31.75),
        (95.524427, -4.024334, 31.75),
        (94.328318, -7.962704, 31.75),
        (95.429888, -9.836733, 31.75),
        (99.487694, -10.766778, 31.75),
        (100.421017, -14.775562, 31.75),
        (102.31202, -15.847733, 31.75),
        (106.291206, -14.624273, 31.75),
        (109.103879, -17.629319, 31.75),
        (111.277621, -17.612346, 31.75),
        (114.111967, -14.563206, 31.75),
        (118.050337, -15.759315, 31.75),
        (119.924366, -14.657745, 31.75),
        (120.854411, -10.599939, 31.75),
        (124.863194, -9.666615, 31.75),
        (125.935366, -7.775613, 31.75),
        (124.711906, -3.796427, 31.75),
        (106.087633, 0, 31.75),
    ]]
    fillet(f9_edges, radius=F9_R)


solid = Compound([f1.part, f8.part])
